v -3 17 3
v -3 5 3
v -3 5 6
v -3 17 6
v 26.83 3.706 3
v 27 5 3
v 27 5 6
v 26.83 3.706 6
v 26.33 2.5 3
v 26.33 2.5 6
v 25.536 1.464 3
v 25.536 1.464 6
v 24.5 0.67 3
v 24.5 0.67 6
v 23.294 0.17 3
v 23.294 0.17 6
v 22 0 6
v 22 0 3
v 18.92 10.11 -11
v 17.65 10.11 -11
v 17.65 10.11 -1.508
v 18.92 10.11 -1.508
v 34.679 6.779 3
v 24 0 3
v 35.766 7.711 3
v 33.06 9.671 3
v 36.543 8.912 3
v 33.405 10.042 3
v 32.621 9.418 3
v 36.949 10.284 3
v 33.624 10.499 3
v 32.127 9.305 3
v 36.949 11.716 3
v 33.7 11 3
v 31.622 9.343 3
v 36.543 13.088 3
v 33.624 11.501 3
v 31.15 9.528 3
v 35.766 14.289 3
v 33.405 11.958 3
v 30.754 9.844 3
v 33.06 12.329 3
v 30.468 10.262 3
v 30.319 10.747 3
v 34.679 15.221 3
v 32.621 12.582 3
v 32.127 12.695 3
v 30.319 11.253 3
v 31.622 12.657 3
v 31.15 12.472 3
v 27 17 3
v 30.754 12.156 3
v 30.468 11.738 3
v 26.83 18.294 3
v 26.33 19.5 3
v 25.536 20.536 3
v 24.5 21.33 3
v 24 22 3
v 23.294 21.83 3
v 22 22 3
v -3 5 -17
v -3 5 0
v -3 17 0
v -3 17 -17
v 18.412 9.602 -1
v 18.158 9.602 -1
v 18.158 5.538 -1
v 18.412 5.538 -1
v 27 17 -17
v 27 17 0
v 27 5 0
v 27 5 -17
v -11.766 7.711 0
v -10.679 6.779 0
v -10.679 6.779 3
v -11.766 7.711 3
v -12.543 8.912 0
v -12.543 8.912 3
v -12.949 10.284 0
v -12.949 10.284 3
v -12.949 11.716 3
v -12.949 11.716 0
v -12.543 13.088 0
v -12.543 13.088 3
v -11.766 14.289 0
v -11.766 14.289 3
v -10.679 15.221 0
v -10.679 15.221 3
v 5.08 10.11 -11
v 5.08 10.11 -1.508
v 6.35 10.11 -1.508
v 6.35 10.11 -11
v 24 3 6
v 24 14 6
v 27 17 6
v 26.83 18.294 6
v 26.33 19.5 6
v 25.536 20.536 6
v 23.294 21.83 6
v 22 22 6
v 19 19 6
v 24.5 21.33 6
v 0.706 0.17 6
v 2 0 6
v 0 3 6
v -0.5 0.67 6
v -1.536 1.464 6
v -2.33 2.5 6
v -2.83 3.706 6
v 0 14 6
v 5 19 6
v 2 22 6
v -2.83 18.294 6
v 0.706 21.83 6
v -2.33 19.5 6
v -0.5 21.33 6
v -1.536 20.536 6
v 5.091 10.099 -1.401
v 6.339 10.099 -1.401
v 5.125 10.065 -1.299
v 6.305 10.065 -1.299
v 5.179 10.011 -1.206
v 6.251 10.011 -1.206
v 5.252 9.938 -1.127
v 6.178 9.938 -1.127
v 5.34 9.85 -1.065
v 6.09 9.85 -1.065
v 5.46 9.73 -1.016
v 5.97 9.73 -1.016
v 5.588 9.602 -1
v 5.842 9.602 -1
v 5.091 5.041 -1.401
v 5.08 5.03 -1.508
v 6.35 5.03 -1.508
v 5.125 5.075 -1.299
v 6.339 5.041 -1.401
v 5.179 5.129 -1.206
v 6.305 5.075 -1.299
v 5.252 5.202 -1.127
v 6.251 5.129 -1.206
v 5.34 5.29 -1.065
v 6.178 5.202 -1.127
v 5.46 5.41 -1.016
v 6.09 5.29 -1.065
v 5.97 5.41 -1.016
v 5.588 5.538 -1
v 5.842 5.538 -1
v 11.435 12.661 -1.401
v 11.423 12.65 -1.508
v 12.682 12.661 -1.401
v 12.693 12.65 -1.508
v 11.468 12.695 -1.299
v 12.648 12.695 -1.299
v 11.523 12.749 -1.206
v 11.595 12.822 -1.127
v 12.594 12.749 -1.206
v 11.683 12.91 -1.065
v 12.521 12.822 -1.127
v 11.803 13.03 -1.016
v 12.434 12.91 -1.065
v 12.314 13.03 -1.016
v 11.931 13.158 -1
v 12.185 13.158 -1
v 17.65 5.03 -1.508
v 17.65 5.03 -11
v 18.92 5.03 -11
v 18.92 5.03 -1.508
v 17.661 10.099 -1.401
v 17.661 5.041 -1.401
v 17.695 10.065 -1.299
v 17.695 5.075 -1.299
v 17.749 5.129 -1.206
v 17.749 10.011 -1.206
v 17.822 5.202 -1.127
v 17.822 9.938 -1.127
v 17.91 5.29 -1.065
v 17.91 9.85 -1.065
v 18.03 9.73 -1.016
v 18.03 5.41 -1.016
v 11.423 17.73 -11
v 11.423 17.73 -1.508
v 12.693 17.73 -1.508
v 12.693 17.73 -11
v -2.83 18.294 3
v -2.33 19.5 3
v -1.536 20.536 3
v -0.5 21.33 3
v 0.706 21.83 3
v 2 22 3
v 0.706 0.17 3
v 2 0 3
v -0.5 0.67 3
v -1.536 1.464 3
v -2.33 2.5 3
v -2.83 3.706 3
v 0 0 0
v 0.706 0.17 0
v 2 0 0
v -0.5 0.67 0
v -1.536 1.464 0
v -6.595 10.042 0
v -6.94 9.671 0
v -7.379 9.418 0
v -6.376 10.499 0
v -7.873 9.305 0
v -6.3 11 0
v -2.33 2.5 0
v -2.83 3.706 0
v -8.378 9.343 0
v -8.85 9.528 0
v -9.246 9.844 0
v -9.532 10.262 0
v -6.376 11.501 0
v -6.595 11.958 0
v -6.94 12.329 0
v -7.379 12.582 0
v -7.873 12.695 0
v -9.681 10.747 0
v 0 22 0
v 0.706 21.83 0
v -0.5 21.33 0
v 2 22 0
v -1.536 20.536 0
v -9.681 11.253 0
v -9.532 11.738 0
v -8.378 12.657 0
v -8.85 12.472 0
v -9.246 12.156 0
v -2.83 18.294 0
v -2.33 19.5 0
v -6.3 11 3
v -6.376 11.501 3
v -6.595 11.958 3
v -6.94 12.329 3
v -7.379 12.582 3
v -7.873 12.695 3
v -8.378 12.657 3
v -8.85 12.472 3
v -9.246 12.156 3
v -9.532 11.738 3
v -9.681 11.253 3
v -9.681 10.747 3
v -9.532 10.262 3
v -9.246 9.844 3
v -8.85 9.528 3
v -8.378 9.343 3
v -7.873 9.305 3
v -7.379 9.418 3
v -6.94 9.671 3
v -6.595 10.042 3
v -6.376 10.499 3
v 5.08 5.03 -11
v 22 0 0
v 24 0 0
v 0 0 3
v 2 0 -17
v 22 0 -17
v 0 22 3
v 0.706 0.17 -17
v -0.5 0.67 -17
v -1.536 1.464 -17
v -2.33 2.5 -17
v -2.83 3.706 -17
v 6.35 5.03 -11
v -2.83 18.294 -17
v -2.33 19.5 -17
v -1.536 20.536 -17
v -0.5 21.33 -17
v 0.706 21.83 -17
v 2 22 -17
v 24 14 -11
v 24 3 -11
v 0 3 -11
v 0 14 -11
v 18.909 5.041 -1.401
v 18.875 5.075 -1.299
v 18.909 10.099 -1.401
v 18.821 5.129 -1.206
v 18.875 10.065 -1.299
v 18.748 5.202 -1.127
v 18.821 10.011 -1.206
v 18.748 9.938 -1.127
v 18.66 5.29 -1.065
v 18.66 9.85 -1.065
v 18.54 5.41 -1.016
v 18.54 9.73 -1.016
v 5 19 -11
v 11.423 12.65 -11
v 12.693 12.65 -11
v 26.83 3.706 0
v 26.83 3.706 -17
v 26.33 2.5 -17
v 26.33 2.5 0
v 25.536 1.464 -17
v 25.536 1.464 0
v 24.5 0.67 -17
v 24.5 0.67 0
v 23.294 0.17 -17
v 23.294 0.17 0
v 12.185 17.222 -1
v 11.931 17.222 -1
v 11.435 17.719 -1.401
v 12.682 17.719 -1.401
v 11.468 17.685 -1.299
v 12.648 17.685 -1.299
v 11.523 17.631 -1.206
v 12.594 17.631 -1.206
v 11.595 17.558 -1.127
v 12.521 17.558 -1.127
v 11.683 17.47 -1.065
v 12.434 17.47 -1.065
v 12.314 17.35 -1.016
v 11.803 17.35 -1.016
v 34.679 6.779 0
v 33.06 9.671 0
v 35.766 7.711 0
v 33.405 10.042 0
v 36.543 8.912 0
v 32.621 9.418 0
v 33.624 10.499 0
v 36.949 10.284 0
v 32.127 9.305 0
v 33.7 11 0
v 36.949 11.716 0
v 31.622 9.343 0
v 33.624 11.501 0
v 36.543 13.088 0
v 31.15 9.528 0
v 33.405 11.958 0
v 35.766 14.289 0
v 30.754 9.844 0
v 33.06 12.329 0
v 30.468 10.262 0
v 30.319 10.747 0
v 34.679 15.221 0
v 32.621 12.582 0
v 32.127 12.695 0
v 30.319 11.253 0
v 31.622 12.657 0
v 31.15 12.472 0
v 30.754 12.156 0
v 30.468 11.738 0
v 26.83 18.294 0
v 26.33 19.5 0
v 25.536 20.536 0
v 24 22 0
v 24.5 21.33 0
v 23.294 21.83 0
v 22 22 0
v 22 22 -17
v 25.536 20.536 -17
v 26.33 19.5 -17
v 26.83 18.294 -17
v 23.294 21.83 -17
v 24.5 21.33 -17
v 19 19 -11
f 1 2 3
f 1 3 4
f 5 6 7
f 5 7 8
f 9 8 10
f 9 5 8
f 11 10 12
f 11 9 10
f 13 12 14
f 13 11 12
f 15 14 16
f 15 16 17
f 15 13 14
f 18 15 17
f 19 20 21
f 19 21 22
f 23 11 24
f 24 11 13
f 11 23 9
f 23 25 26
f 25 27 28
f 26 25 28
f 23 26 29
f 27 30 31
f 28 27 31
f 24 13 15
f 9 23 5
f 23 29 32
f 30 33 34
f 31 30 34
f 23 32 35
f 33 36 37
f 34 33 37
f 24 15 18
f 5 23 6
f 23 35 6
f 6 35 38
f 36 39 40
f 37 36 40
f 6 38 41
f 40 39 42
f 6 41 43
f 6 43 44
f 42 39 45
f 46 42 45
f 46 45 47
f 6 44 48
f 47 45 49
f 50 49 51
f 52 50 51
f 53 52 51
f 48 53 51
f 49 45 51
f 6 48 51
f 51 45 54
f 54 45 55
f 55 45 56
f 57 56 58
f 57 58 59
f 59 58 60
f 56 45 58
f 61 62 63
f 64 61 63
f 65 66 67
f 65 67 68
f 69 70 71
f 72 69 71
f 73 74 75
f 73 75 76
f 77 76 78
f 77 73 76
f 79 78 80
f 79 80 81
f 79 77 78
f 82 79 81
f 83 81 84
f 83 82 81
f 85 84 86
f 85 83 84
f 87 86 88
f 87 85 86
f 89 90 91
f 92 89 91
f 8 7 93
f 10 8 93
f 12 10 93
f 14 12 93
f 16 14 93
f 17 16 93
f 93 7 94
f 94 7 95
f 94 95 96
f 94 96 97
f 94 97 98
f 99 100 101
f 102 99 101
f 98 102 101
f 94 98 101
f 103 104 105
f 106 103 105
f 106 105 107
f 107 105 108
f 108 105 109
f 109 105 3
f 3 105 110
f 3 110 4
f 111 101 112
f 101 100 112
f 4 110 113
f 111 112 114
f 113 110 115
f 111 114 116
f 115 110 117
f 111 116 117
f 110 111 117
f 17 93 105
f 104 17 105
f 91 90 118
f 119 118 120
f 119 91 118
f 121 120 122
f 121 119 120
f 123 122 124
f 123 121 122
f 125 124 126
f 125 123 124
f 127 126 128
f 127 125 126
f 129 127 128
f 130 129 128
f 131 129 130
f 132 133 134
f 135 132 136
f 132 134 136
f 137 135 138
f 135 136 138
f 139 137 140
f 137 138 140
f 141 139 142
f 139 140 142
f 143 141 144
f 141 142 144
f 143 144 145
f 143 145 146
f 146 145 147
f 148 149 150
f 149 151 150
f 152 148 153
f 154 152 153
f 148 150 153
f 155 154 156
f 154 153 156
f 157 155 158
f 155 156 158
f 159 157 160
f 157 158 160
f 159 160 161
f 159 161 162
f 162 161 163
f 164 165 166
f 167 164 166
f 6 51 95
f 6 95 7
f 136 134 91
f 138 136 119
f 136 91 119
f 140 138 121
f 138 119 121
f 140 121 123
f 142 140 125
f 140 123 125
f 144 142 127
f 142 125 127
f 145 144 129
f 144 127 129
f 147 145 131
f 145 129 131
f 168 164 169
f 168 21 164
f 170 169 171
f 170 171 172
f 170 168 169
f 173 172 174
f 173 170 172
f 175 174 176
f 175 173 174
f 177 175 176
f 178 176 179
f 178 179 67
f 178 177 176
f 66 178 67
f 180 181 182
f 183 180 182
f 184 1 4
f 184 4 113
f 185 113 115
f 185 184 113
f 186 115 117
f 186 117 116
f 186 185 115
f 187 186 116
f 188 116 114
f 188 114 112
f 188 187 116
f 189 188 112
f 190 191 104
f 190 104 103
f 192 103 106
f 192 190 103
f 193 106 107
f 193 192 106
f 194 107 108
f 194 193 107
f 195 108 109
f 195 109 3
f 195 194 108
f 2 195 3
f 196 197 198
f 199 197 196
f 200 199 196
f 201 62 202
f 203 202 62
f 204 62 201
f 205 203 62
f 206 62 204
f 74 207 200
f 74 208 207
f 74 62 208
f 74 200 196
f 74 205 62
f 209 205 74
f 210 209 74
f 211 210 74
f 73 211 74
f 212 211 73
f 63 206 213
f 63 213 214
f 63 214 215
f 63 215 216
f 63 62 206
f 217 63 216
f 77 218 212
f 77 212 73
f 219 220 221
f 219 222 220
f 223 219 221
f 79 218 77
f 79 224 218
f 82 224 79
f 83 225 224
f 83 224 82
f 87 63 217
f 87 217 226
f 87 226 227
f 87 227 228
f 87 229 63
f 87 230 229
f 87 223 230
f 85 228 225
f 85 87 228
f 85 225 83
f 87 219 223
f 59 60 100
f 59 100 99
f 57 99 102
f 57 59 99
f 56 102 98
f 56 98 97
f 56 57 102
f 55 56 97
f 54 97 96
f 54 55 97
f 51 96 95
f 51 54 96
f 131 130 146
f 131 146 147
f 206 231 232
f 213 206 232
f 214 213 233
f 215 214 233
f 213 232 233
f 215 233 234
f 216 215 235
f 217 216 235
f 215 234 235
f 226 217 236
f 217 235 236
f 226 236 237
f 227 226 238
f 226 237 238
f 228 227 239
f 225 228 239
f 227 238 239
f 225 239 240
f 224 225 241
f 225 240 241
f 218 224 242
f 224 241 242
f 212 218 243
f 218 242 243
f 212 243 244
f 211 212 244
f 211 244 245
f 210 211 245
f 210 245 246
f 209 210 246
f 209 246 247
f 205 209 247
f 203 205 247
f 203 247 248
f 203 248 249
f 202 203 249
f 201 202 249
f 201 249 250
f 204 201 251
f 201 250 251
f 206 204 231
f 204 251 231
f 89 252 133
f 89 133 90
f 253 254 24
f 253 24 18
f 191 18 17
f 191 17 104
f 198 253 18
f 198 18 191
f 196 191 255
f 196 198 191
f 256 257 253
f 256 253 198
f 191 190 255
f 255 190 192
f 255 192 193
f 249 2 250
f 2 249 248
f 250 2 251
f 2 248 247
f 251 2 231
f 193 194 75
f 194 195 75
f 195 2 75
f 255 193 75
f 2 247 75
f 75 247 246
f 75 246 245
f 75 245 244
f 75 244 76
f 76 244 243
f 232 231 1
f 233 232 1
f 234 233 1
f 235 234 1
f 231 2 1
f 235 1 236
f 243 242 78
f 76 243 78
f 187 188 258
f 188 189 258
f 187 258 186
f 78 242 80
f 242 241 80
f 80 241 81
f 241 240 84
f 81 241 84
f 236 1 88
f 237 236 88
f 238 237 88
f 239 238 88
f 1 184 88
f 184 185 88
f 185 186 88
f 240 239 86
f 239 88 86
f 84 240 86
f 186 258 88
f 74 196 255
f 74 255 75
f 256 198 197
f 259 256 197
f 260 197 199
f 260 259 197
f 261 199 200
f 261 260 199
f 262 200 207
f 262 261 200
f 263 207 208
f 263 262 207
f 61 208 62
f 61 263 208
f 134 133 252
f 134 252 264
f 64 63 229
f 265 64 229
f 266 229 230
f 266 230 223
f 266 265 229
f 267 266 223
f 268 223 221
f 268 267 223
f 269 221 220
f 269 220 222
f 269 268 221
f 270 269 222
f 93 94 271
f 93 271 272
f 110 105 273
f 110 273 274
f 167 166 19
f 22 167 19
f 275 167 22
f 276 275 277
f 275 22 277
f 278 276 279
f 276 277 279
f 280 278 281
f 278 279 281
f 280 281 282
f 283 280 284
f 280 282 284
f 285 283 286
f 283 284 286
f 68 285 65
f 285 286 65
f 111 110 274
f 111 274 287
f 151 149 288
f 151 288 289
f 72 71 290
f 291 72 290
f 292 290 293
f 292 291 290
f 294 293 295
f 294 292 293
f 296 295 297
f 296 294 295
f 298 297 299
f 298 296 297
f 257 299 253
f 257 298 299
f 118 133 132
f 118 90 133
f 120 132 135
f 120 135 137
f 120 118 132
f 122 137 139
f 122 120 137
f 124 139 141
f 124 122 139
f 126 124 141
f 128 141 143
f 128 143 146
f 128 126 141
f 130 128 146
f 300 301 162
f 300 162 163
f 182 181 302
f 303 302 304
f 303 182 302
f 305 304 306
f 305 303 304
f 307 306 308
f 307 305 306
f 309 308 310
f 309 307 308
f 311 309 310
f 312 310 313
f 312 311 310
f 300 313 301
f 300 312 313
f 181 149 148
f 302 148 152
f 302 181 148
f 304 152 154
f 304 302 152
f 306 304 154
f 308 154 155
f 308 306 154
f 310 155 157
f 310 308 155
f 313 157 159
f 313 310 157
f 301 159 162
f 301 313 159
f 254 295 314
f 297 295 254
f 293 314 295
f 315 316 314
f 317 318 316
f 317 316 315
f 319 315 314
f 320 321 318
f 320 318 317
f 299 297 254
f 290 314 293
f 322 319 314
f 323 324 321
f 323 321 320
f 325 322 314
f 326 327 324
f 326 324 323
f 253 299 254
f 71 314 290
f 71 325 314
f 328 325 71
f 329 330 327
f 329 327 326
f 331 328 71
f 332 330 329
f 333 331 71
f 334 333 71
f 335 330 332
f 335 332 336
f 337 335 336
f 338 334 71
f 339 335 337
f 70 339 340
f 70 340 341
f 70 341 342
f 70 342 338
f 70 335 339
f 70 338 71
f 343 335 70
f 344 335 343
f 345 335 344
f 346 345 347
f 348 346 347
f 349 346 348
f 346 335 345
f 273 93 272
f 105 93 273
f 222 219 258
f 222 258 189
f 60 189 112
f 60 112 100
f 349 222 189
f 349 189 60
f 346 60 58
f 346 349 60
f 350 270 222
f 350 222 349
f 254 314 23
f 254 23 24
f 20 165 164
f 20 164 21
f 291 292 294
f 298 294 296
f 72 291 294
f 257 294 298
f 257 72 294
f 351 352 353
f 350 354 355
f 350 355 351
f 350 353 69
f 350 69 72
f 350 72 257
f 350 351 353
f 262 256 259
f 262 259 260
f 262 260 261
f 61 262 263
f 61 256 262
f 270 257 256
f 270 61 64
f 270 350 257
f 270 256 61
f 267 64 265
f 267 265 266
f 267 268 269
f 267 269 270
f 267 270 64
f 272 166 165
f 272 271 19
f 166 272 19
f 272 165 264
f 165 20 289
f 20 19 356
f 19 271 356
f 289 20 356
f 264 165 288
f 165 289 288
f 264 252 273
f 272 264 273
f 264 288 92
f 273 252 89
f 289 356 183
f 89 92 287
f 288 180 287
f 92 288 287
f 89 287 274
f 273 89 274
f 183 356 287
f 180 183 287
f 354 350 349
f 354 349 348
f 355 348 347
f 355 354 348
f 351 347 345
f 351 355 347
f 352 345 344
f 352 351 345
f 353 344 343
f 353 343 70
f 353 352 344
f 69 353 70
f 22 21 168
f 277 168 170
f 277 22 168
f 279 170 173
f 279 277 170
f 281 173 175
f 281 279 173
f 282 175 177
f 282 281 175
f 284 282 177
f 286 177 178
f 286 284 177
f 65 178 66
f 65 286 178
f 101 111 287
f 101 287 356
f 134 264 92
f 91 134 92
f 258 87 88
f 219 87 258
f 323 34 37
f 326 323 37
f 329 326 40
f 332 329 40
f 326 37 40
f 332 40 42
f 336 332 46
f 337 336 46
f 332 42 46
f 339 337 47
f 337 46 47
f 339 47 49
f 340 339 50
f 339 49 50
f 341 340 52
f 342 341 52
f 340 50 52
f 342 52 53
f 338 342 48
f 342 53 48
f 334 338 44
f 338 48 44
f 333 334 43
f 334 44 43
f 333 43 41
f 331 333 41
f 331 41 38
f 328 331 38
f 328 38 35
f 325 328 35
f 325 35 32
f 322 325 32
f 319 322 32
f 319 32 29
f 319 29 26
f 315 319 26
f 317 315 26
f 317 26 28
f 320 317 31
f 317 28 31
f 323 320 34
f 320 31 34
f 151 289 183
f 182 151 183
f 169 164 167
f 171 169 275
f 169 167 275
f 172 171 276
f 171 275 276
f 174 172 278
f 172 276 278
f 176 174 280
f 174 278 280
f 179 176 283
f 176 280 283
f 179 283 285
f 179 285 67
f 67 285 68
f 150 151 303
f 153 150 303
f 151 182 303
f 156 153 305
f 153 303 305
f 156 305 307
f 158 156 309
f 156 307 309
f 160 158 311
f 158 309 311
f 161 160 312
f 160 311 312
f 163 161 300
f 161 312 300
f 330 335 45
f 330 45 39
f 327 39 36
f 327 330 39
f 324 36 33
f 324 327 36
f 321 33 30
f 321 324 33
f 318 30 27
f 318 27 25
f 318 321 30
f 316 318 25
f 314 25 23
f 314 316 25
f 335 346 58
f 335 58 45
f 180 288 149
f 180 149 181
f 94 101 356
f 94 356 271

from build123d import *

# Parameters (mm, degrees)
BOSS_EXTRUDE1_DEPTH      = 3
SKETCH2_R                = 1.7
CUT_EXTRUDE1_DEPTH       = 3
BOSS_EXTRUDE2_DEPTH      = 3
BOSS_EXTRUDE2_DEPTH_BACK = 20
CUT_EXTRUDE2_DEPTH       = 17
SKETCH6_W                = 1.27
SKETCH6_H                = 5.08
BOSS_EXTRUDE3_DEPTH      = 10
FILLET1_R                = 0.508


with BuildPart() as part:
    # Sketch1 → Boss-Extrude1 (new body)
    with BuildSketch(Plane.XY):
        with BuildLine():
            Line((24, 22), (34.679465326, 15.221429328))
            ThreePointArc((34.679465326, 15.221429328), (37, 11), (34.679465326, 6.778570672))
            Line((34.679465326, 6.778570672), (24, 0))
            Line((24, 0), (0, 0))
            Line((0, 0), (-10.679465326, 6.778570672))
            ThreePointArc((-10.679465326, 6.778570672), (-13, 11), (-10.679465326, 15.221429328))
            Line((-10.679465326, 15.221429328), (0, 22))
            Line((0, 22), (24, 22))
        make_face()
    extrude(amount=BOSS_EXTRUDE1_DEPTH)

    # Sketch2 → Cut-Extrude1 (cut)
    with BuildSketch(Plane.XY.offset(3)):
        with Locations((32, 11)):
            Circle(SKETCH2_R)
        with Locations((-8, 11)):
            Circle(SKETCH2_R)
    extrude(amount=-CUT_EXTRUDE1_DEPTH, mode=Mode.SUBTRACT)

    # Sketch3 → Boss-Extrude2 (add, two sides: drawn at the far end of the back side and taken through both)
    with BuildSketch(Plane.XY.offset(3).offset(-BOSS_EXTRUDE2_DEPTH_BACK)):
        with BuildLine():
            Line((2, 22), (22, 22))
            ThreePointArc((22, 22), (25.535533906, 20.535533906), (27, 17))
            Line((27, 17), (27, 5))
            ThreePointArc((27, 5), (25.535533906, 1.464466094), (22, 0))
            Line((22, 0), (2, 0))
            ThreePointArc((2, 0), (-1.535533906, 1.464466094), (-3, 5))
            Line((-3, 5), (-3, 17))
            ThreePointArc((-3, 17), (-1.535533906, 20.535533906), (2, 22))
        make_face()
    extrude(amount=BOSS_EXTRUDE2_DEPTH + BOSS_EXTRUDE2_DEPTH_BACK)

    # Sketch5 → Cut-Extrude2 (cut)
    with BuildSketch(Plane.XY.offset(6)):
        Polygon((5, 19), (19, 19), (24, 14), (24, 3), (0, 3), (0, 14), align=None)
    extrude(amount=-CUT_EXTRUDE2_DEPTH, mode=Mode.SUBTRACT)

    # Sketch6 → Boss-Extrude3 (add)
    with BuildSketch(Plane.XY.offset(-11)):
        with Locations((12.058361068, 15.19)):
            Rectangle(SKETCH6_W, SKETCH6_H)
        with Locations((18.285, 7.57)):
            Rectangle(SKETCH6_W, SKETCH6_H)
        with Locations((5.715, 7.57)):
            Rectangle(SKETCH6_W, SKETCH6_H)
    extrude(amount=BOSS_EXTRUDE3_DEPTH)

    # Fillet1
    fillet1_edges = [part.edges().sort_by_distance(p)[0] for p in [
        (18.92, 7.57, -1),
        (18.285, 10.11, -1),
        (17.65, 7.57, -1),
        (18.285, 5.03, -1),
        (6.35, 7.57, -1),
        (5.715, 10.11, -1),
        (5.08, 7.57, -1),
        (5.715, 5.03, -1),
        (12.693361068, 15.19, -1),
        (12.058361068, 17.73, -1),
        (11.423361068, 15.19, -1),
        (12.058361068, 12.65, -1),
    ]]
    fillet(fillet1_edges, radius=FILLET1_R)


solid = part.part
